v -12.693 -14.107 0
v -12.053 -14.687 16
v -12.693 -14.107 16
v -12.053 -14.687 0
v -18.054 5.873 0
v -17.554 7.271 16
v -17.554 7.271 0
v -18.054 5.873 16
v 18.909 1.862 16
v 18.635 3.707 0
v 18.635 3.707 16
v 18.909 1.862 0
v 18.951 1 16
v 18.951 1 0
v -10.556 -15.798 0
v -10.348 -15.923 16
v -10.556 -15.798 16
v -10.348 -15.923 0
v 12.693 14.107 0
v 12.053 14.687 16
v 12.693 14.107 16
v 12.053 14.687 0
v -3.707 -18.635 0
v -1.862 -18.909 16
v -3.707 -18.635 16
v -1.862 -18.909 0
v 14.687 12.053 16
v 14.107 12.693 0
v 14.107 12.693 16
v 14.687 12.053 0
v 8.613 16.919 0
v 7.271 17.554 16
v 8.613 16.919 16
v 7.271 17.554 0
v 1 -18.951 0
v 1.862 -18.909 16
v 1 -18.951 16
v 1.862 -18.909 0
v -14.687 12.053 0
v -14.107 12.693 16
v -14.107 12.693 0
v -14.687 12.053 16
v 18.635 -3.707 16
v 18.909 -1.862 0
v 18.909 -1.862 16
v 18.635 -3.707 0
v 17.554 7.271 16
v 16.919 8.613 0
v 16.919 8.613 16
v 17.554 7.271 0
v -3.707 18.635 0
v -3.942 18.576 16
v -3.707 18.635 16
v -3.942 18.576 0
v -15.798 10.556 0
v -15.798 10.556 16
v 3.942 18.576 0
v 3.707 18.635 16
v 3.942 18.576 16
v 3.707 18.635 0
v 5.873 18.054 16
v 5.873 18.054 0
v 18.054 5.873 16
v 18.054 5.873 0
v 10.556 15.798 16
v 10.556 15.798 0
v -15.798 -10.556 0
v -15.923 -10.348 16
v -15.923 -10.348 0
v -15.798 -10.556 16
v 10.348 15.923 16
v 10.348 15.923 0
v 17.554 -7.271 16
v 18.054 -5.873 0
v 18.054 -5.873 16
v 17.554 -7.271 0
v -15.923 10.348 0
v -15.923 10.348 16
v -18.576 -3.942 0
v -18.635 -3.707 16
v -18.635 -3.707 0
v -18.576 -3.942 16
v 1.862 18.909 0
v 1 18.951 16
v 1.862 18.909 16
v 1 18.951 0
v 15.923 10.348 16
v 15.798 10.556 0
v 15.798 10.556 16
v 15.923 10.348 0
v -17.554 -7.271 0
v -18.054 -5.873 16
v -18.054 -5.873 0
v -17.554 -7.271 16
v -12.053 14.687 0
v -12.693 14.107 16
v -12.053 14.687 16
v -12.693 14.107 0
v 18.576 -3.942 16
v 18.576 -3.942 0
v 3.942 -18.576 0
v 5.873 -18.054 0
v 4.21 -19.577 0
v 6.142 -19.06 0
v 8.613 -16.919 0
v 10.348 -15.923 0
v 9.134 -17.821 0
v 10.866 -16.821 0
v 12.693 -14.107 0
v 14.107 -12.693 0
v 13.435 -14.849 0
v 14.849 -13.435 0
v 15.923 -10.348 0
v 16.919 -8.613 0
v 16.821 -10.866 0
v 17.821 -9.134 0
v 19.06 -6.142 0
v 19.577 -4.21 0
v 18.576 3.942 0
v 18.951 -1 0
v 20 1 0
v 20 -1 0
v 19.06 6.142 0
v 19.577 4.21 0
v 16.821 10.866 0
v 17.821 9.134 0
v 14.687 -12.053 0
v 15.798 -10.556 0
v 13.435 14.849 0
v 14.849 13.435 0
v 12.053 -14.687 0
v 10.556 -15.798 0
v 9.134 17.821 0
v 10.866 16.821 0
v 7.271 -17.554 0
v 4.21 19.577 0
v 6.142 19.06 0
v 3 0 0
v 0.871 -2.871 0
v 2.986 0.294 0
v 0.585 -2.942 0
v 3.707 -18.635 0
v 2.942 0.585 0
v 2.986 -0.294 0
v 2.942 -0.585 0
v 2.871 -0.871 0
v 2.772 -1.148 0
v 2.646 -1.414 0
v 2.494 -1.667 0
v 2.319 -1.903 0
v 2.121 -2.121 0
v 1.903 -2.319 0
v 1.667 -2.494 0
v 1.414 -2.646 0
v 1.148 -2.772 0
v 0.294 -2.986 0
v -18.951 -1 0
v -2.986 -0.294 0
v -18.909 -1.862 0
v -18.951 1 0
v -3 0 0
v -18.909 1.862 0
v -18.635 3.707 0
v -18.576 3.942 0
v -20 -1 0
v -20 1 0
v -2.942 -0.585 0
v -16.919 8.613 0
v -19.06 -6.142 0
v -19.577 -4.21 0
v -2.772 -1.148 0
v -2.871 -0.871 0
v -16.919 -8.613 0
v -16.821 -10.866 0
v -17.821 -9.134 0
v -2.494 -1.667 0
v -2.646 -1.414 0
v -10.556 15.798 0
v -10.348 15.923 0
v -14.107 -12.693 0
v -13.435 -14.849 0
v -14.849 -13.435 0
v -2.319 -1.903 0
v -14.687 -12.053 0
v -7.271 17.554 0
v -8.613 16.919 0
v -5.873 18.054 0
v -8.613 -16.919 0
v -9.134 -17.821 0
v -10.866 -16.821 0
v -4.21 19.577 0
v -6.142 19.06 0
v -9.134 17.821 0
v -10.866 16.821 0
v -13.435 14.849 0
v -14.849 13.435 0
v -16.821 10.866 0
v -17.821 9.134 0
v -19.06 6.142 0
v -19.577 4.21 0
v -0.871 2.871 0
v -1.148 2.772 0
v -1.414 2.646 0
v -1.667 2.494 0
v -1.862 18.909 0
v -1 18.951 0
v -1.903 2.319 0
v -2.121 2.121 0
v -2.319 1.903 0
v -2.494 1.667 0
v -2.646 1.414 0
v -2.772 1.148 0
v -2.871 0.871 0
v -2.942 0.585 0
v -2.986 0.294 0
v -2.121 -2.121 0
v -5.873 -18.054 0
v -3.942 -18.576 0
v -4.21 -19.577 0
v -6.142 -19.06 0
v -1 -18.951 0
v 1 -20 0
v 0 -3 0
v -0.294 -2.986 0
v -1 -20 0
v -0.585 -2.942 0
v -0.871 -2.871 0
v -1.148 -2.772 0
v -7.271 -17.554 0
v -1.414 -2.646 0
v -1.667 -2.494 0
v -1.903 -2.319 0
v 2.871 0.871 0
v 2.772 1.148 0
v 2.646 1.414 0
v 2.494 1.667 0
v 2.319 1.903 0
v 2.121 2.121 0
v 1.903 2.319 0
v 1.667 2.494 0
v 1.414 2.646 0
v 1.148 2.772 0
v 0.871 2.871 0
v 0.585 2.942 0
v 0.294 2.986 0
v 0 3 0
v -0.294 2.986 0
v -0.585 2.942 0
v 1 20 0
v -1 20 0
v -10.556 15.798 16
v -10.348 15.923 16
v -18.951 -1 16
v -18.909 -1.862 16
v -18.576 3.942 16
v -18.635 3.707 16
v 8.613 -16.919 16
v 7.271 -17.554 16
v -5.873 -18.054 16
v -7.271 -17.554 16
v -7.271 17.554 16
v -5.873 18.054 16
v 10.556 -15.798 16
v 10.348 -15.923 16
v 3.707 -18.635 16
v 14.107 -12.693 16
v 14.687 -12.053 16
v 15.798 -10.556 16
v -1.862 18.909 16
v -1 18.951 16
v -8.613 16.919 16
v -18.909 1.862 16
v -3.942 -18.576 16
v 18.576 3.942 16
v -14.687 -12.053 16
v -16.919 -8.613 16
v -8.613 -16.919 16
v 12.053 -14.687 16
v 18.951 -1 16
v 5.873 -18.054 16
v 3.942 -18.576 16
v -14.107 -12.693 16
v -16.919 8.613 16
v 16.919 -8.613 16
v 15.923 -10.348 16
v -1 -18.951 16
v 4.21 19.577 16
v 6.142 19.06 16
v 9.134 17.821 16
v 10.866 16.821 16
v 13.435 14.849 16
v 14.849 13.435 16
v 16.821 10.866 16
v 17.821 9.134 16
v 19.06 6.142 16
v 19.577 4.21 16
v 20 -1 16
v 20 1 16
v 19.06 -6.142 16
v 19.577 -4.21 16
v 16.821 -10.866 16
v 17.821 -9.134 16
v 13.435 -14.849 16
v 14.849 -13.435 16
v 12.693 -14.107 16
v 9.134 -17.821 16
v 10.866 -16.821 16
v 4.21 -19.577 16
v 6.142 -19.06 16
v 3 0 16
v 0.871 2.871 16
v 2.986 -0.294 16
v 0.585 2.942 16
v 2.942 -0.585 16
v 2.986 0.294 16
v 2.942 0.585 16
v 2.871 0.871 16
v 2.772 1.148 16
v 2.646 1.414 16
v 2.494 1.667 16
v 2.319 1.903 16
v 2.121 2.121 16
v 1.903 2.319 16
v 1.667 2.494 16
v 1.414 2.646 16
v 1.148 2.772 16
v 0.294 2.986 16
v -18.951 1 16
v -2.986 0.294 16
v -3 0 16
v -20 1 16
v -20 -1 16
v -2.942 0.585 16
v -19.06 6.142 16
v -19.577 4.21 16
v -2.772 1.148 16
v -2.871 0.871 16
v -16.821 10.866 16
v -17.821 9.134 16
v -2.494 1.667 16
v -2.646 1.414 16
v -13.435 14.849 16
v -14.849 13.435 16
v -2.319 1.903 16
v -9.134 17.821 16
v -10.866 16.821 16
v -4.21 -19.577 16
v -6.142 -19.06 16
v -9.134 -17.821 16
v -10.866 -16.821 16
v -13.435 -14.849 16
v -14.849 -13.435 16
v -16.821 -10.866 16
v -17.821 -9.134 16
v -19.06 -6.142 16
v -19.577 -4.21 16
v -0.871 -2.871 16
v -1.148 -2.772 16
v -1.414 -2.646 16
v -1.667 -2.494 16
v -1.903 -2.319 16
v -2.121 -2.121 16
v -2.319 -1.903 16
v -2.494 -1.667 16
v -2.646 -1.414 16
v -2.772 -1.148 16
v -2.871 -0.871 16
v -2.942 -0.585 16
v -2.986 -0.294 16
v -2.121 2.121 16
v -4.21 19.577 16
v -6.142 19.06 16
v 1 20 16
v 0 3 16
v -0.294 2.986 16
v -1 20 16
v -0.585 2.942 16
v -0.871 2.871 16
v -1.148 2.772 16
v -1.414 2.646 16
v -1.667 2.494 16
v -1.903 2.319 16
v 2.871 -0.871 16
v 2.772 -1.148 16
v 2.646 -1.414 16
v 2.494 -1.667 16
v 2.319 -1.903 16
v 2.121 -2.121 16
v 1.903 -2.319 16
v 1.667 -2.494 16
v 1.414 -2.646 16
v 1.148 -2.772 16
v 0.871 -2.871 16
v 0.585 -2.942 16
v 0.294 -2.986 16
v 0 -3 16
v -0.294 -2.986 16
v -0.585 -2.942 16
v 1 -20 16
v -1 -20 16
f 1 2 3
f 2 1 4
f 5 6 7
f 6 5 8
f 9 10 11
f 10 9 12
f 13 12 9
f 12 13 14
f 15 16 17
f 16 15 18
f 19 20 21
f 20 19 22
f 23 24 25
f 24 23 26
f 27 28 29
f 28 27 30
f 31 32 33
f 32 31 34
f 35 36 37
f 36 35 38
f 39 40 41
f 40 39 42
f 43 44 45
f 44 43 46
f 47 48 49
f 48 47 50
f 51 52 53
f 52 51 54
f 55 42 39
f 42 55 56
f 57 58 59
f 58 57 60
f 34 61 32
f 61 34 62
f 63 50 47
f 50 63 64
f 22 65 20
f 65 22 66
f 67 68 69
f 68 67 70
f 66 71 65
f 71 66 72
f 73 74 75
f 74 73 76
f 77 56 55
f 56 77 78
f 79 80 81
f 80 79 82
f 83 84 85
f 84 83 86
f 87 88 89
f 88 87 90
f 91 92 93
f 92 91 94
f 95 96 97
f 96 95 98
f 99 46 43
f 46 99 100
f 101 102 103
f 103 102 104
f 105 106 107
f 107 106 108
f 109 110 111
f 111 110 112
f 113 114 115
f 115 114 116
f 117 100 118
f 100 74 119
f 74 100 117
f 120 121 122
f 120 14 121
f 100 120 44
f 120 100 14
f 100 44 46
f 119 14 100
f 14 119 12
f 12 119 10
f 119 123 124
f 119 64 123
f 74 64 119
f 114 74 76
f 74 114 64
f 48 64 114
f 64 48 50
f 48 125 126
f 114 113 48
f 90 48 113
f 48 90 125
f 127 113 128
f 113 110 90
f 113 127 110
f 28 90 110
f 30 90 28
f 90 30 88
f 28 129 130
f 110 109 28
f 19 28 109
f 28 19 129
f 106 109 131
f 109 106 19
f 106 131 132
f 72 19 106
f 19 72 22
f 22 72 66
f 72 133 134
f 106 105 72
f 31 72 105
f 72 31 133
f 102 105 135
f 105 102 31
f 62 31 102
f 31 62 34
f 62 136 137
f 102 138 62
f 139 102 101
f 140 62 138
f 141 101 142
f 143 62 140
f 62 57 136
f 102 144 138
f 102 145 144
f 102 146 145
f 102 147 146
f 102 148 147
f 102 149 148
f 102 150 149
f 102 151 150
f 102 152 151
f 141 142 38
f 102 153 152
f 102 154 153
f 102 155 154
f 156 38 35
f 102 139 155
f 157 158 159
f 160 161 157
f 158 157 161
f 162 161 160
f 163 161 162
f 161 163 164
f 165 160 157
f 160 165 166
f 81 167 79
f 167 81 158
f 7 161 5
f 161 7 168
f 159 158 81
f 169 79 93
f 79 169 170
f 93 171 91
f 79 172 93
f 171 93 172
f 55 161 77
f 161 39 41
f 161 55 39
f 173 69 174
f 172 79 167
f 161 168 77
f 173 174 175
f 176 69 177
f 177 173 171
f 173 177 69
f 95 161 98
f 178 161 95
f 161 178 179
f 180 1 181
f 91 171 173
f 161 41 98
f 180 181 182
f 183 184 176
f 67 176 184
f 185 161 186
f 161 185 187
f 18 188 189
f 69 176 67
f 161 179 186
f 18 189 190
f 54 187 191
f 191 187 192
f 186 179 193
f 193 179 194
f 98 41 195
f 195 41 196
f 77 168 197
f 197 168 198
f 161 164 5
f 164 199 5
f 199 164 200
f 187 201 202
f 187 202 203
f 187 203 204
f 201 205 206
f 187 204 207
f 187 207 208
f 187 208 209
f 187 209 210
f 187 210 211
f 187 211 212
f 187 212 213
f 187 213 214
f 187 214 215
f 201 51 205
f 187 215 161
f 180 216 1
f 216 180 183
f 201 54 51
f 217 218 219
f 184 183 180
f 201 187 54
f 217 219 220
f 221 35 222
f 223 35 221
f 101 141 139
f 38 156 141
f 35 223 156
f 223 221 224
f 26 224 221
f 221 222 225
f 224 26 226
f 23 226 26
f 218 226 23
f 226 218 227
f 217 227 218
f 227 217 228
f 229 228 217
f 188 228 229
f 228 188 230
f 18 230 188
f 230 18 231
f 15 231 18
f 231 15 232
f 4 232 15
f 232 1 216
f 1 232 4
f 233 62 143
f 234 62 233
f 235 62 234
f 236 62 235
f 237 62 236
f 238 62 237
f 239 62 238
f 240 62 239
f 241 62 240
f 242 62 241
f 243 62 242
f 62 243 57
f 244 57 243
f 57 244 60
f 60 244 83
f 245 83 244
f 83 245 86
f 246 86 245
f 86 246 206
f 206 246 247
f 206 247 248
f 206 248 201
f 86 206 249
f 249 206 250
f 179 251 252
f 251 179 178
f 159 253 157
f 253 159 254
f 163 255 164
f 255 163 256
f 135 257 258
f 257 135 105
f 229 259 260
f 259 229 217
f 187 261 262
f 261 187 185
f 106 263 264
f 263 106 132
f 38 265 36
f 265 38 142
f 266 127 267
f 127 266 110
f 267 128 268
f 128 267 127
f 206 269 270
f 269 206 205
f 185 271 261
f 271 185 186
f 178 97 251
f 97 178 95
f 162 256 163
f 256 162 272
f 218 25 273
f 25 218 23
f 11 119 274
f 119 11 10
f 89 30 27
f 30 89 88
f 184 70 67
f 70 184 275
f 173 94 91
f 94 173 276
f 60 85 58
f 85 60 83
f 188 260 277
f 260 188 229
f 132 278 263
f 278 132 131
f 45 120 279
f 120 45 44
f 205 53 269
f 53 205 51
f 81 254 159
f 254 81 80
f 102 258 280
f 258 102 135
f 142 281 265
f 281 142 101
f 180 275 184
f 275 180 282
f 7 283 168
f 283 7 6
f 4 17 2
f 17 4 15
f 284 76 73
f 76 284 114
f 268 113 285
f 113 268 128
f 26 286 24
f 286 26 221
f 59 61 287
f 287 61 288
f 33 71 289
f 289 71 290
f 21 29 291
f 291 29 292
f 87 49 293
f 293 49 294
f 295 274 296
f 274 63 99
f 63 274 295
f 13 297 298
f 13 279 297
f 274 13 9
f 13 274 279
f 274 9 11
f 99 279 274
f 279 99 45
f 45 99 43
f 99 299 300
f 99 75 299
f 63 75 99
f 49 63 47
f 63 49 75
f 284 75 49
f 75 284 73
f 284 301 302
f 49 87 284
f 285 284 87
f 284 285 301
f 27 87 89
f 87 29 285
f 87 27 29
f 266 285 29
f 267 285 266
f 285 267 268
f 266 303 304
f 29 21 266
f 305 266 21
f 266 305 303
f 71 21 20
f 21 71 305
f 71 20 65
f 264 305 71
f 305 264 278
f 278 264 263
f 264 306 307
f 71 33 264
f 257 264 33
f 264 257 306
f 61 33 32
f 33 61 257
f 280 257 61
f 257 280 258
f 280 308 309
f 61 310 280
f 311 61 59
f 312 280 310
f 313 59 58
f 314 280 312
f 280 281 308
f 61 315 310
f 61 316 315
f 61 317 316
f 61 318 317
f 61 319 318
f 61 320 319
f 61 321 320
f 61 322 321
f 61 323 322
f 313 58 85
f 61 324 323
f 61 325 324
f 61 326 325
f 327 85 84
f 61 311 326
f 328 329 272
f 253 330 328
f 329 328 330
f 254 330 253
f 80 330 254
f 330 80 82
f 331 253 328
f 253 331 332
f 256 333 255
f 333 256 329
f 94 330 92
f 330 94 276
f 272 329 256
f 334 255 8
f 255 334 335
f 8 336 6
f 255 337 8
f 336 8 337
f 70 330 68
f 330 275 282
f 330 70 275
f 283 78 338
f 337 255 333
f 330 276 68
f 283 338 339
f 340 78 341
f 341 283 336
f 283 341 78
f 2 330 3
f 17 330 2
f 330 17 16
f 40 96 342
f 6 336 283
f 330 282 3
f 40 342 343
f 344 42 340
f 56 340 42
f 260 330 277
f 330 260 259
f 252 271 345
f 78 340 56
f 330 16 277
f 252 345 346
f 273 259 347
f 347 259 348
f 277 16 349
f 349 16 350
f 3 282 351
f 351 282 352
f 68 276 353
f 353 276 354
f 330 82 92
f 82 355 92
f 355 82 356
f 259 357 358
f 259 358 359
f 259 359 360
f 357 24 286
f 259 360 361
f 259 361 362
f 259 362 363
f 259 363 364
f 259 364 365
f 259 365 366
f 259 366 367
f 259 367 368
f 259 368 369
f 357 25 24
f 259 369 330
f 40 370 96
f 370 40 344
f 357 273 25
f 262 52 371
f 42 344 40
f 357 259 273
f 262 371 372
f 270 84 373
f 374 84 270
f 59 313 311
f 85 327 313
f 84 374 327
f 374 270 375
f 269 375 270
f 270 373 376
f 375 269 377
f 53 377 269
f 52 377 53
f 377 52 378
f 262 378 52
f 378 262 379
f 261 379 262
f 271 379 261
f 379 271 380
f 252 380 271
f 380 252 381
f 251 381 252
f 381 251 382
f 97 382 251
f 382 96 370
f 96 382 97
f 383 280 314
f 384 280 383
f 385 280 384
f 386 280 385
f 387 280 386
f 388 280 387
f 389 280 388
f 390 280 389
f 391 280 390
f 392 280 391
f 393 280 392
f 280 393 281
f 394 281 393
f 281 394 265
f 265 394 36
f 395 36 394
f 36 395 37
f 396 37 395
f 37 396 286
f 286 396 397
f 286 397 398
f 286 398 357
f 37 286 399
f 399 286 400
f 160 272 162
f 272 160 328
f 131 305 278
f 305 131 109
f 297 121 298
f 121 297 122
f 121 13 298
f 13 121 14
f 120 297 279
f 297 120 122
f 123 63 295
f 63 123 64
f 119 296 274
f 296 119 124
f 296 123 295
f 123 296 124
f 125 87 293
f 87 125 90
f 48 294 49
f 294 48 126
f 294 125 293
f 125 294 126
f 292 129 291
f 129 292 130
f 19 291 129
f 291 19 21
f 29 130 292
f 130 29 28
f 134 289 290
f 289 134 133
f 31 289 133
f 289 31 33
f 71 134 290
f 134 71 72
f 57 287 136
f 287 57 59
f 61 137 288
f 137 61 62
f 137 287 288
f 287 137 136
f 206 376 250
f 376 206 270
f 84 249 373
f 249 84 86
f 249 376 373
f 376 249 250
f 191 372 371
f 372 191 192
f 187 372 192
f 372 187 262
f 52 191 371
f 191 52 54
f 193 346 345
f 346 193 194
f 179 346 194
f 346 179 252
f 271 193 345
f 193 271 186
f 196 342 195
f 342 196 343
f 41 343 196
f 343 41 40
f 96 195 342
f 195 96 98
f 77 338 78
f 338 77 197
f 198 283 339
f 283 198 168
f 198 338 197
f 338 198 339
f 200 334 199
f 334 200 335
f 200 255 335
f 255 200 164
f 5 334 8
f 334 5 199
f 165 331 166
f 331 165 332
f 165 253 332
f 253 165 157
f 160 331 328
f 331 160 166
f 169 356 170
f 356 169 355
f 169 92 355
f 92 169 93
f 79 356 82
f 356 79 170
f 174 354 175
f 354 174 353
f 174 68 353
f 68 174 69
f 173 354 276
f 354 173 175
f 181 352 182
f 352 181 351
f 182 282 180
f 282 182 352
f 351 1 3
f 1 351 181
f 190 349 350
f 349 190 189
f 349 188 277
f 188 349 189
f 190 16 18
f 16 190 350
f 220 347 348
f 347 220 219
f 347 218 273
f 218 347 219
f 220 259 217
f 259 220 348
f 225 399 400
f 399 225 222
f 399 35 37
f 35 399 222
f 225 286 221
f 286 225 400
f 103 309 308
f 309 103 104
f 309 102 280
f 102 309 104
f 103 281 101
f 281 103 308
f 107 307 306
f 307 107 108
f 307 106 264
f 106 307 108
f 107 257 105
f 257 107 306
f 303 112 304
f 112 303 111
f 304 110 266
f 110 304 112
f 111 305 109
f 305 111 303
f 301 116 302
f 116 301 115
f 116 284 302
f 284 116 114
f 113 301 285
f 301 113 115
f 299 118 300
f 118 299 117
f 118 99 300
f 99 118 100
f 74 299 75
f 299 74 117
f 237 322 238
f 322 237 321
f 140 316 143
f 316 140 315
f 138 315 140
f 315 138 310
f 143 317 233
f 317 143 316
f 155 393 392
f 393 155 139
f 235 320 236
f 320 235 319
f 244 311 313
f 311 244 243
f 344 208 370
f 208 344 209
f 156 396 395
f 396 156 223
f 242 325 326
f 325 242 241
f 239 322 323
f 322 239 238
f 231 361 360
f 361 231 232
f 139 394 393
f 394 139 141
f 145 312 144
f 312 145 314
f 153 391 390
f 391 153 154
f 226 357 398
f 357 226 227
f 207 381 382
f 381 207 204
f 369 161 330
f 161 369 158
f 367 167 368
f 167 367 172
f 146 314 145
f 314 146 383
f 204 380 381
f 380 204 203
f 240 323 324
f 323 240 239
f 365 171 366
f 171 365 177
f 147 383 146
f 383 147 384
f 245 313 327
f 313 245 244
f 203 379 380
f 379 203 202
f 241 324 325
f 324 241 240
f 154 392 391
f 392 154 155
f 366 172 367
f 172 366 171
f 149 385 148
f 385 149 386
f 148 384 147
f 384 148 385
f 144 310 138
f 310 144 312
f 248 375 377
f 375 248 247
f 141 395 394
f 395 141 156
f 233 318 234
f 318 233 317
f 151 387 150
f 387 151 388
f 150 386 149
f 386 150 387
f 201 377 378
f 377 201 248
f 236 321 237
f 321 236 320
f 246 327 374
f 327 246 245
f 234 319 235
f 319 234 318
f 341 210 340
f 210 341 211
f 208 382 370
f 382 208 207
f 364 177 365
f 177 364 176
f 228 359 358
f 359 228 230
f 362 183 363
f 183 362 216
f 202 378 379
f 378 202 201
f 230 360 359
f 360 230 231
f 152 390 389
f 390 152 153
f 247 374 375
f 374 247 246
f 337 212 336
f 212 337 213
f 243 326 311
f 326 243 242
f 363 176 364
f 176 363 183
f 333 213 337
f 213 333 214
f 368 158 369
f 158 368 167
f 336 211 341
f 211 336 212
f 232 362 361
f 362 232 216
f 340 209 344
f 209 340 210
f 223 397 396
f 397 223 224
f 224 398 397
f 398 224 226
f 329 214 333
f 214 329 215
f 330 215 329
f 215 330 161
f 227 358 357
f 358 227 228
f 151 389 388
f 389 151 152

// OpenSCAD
// Generated with SolidPython2 for OpenSCAD task-025
$fn = 64;

difference() {
	union() {
		translate(v = [0, 0, 0]) {
			cylinder(h = 16, r = 19.0);
		}
		rotate(a = [0, 0, 0]) {
			translate(v = [8, -1, 0]) {
				cube(size = [12, 2, 16]);
			}
		}
		rotate(a = [0, 0, 15]) {
			translate(v = [8, -1, 0]) {
				cube(size = [12, 2, 16]);
			}
		}
		rotate(a = [0, 0, 30]) {
			translate(v = [8, -1, 0]) {
				cube(size = [12, 2, 16]);
			}
		}
		rotate(a = [0, 0, 45]) {
			translate(v = [8, -1, 0]) {
				cube(size = [12, 2, 16]);
			}
		}
		rotate(a = [0, 0, 60]) {
			translate(v = [8, -1, 0]) {
				cube(size = [12, 2, 16]);
			}
		}
		rotate(a = [0, 0, 75]) {
			translate(v = [8, -1, 0]) {
				cube(size = [12, 2, 16]);
			}
		}
		rotate(a = [0, 0, 90]) {
			translate(v = [8, -1, 0]) {
				cube(size = [12, 2, 16]);
			}
		}
		rotate(a = [0, 0, 105]) {
			translate(v = [8, -1, 0]) {
				cube(size = [12, 2, 16]);
			}
		}
		rotate(a = [0, 0, 120]) {
			translate(v = [8, -1, 0]) {
				cube(size = [12, 2, 16]);
			}
		}
		rotate(a = [0, 0, 135]) {
			translate(v = [8, -1, 0]) {
				cube(size = [12, 2, 16]);
			}
		}
		rotate(a = [0, 0, 150]) {
			translate(v = [8, -1, 0]) {
				cube(size = [12, 2, 16]);
			}
		}
		rotate(a = [0, 0, 165]) {
			translate(v = [8, -1, 0]) {
				cube(size = [12, 2, 16]);
			}
		}
		rotate(a = [0, 0, 180]) {
			translate(v = [8, -1, 0]) {
				cube(size = [12, 2, 16]);
			}
		}
		rotate(a = [0, 0, 195]) {
			translate(v = [8, -1, 0]) {
				cube(size = [12, 2, 16]);
			}
		}
		rotate(a = [0, 0, 210]) {
			translate(v = [8, -1, 0]) {
				cube(size = [12, 2, 16]);
			}
		}
		rotate(a = [0, 0, 225]) {
			translate(v = [8, -1, 0]) {
				cube(size = [12, 2, 16]);
			}
		}
		rotate(a = [0, 0, 240]) {
			translate(v = [8, -1, 0]) {
				cube(size = [12, 2, 16]);
			}
		}
		rotate(a = [0, 0, 255]) {
			translate(v = [8, -1, 0]) {
				cube(size = [12, 2, 16]);
			}
		}
		rotate(a = [0, 0, 270]) {
			translate(v = [8, -1, 0]) {
				cube(size = [12, 2, 16]);
			}
		}
		rotate(a = [0, 0, 285]) {
			translate(v = [8, -1, 0]) {
				cube(size = [12, 2, 16]);
			}
		}
		rotate(a = [0, 0, 300]) {
			translate(v = [8, -1, 0]) {
				cube(size = [12, 2, 16]);
			}
		}
		rotate(a = [0, 0, 315]) {
			translate(v = [8, -1, 0]) {
				cube(size = [12, 2, 16]);
			}
		}
		rotate(a = [0, 0, 330]) {
			translate(v = [8, -1, 0]) {
				cube(size = [12, 2, 16]);
			}
		}
		rotate(a = [0, 0, 345]) {
			translate(v = [8, -1, 0]) {
				cube(size = [12, 2, 16]);
			}
		}
	}
	translate(v = [0, 0, -1]) {
		cylinder(h = 18, r = 3.0);
	}
}
